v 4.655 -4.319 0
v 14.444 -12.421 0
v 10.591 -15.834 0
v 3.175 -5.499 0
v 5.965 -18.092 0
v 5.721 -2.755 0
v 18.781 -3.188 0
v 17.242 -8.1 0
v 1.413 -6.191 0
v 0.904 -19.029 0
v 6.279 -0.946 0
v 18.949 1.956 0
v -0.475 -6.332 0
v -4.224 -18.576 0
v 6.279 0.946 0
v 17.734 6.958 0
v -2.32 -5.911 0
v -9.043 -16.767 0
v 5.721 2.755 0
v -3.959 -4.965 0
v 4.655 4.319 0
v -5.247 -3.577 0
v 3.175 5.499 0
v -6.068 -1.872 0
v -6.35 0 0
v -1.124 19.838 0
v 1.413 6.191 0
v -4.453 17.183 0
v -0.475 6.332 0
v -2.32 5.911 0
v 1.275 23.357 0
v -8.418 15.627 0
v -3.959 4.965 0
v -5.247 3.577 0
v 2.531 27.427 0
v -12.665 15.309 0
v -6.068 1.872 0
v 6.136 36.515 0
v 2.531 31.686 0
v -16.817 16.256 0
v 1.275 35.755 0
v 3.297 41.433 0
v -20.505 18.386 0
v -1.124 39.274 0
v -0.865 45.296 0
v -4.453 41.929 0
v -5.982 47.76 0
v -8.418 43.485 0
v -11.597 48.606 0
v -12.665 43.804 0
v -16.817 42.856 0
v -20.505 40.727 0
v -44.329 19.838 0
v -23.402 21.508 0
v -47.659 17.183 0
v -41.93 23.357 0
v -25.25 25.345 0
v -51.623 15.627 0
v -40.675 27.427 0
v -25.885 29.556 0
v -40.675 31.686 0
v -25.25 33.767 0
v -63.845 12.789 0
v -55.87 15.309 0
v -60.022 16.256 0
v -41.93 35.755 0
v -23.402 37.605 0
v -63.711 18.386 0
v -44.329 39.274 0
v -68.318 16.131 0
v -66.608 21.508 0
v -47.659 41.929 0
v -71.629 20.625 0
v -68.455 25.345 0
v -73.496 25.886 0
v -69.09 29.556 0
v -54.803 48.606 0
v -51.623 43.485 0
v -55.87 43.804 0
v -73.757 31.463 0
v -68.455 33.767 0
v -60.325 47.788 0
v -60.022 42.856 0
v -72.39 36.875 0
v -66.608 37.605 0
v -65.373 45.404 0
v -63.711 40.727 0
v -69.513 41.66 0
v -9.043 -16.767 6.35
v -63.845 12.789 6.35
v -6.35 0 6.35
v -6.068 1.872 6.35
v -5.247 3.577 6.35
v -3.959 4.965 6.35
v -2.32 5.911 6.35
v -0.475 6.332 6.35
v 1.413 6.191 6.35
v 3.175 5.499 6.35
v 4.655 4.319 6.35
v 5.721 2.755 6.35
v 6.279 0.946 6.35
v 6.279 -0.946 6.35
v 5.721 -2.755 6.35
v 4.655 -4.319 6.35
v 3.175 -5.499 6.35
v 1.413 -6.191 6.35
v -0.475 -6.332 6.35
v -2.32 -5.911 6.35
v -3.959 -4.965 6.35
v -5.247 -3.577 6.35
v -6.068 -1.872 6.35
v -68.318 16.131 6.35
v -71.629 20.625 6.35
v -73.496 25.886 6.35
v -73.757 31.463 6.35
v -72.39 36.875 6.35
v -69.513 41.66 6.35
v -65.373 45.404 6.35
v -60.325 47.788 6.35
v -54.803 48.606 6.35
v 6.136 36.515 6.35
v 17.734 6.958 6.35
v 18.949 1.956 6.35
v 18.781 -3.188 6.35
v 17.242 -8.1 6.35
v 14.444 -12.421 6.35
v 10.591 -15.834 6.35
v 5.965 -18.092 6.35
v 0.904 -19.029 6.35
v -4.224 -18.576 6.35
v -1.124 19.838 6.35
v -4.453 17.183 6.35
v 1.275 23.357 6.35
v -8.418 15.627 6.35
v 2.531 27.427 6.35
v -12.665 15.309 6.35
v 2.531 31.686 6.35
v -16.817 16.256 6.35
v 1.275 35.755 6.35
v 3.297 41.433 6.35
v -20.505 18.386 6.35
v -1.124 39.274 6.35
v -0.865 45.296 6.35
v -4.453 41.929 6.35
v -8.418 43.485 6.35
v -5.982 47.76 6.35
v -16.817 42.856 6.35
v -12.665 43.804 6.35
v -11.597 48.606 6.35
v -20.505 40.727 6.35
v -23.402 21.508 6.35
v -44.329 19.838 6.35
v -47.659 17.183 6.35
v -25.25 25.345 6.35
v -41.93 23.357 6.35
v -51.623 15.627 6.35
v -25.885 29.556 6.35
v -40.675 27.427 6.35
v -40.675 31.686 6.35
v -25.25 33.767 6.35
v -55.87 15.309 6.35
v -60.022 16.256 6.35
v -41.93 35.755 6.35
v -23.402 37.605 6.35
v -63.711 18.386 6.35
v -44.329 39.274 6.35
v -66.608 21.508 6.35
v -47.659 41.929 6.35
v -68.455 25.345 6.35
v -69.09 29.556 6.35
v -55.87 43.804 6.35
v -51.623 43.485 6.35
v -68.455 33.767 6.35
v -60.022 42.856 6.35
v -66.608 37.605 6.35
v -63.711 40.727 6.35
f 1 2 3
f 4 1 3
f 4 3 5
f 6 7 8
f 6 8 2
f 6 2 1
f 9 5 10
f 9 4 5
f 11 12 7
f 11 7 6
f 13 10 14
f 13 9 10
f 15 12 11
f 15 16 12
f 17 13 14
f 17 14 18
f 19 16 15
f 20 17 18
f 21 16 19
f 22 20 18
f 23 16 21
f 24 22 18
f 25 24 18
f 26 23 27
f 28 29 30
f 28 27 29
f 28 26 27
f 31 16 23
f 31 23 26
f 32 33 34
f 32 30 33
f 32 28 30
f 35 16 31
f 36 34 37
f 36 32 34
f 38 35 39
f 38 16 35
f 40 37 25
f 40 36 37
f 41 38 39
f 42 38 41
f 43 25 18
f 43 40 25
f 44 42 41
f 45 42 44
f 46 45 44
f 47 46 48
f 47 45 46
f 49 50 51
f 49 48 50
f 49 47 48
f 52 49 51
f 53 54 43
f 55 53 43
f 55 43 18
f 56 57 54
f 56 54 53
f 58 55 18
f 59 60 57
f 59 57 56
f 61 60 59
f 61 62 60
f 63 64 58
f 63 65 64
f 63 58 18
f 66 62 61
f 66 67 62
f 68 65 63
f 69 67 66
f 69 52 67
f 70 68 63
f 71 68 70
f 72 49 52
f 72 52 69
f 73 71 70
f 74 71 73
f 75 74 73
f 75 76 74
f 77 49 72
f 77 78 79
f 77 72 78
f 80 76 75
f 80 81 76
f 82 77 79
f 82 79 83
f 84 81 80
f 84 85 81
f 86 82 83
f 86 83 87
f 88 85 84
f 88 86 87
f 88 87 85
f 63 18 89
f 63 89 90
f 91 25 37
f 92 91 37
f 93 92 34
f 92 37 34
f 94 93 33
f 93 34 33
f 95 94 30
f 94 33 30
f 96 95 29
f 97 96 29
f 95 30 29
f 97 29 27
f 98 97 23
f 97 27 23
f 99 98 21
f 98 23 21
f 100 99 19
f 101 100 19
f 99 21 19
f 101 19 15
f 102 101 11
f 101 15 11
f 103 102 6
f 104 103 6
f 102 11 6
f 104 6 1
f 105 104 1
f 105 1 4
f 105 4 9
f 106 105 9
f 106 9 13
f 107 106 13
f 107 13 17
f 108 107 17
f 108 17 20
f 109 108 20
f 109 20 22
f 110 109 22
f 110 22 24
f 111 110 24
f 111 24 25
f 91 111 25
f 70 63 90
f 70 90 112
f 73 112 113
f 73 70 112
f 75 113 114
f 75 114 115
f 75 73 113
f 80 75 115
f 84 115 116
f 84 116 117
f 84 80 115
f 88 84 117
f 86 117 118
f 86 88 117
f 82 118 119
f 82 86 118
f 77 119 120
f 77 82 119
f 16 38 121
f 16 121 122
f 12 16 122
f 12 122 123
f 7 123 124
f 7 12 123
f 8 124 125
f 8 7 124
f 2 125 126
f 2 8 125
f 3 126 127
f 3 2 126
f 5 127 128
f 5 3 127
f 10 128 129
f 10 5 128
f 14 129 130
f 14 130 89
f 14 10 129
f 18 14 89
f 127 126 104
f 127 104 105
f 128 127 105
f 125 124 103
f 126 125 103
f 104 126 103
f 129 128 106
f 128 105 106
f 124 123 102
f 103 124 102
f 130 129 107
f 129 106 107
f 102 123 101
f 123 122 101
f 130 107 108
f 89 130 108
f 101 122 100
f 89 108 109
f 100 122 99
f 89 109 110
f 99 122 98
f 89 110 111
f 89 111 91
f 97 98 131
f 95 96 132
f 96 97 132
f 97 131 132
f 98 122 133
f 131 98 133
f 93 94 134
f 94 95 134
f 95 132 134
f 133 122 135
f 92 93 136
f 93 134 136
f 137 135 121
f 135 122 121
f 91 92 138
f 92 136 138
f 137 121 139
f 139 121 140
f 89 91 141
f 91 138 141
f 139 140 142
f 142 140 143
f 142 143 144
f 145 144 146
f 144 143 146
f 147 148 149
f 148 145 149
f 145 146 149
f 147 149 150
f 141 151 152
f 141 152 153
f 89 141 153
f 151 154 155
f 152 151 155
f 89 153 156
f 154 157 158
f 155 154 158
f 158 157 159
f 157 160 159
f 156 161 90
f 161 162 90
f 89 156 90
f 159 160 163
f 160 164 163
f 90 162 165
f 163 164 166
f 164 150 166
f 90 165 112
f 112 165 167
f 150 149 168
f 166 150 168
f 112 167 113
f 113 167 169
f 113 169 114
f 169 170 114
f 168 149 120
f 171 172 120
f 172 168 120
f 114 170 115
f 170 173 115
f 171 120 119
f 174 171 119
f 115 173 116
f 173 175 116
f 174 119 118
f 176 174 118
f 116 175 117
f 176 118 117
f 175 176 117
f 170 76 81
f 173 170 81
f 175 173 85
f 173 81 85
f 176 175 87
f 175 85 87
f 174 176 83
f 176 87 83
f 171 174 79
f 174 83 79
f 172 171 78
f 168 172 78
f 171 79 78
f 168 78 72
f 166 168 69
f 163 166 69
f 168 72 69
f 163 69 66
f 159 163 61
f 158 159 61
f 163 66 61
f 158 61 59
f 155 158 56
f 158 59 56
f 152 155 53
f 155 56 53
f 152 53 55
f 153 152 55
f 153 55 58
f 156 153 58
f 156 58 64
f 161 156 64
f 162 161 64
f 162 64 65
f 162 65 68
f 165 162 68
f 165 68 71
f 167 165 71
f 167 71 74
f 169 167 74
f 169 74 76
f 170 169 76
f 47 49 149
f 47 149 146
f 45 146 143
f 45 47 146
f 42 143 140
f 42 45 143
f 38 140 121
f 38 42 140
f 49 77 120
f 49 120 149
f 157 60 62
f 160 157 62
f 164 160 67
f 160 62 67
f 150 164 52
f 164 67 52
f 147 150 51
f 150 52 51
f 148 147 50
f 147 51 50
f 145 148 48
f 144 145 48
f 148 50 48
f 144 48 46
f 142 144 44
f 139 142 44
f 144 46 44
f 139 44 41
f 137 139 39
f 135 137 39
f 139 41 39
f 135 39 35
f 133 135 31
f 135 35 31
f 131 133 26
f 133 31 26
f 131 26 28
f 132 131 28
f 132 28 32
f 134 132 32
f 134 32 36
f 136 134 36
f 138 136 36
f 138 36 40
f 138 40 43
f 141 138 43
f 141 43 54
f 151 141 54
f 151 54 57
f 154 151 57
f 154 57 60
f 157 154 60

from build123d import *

# Parameters (mm, degrees)
BOSS_EXTRUDE1_DEPTH            = 6.35
F_1_1_DIAMETER_HOLE1_D         = 28.575
F_1_1_DIAMETER_HOLE1_DEPTH     = 25.4
F_1_1_DIAMETER_HOLE1_TIP       = 8.584796094
F_1_2_0_5_DIAMETER_HOLE1_D     = 12.7
F_1_2_0_5_DIAMETER_HOLE1_DEPTH = 25.4
F_1_2_0_5_DIAMETER_HOLE1_TIP   = 3.815464931


with BuildPart() as part:
    # Sketch1 → Boss-Extrude1 (new body)
    with BuildSketch(Plane.XY):
        with BuildLine():
            Line((-54.802639065, 48.60615919), (-11.597239065, 48.60615919))
            ThreePointArc((-11.597239065, 48.60615919), (-0.865369296, 45.295583298), (6.136456449, 36.514502629))
            Line((6.136456449, 36.514502629), (17.733695514, 6.958343439))
            ThreePointArc((17.733695514, 6.958343439), (12.633512254, -14.258221072), (-9.042758094, -16.766962338))
            Line((-9.042758094, -16.766962338), (-63.84539716, 12.789196852))
            ThreePointArc((-63.84539716, 12.789196852), (-73.273063161, 34.219412746), (-54.802639065, 48.60615919))
        make_face()
    extrude(amount=BOSS_EXTRUDE1_DEPTH)

    # 1 (1) Diameter Hole1
    with Locations(Plane.XY.offset(6.35)):
        with Locations((-54.802639065, 29.55615919), (-11.597239065, 29.55615919)):
            Hole(F_1_1_DIAMETER_HOLE1_D / 2, depth=F_1_1_DIAMETER_HOLE1_DEPTH)
            with Locations((0, 0, -(F_1_1_DIAMETER_HOLE1_DEPTH + F_1_1_DIAMETER_HOLE1_TIP / 2))):  # 118° drill point
                Cone(0, F_1_1_DIAMETER_HOLE1_D / 2, F_1_1_DIAMETER_HOLE1_TIP, mode=Mode.SUBTRACT)

    # 1/2 (0.5) Diameter Hole1
    with Locations(Plane.XY.offset(6.35)):
        with Locations((0, 0)):
            Hole(F_1_2_0_5_DIAMETER_HOLE1_D / 2, depth=F_1_2_0_5_DIAMETER_HOLE1_DEPTH)
            with Locations((0, 0, -(F_1_2_0_5_DIAMETER_HOLE1_DEPTH + F_1_2_0_5_DIAMETER_HOLE1_TIP / 2))):  # 118° drill point
                Cone(0, F_1_2_0_5_DIAMETER_HOLE1_D / 2, F_1_2_0_5_DIAMETER_HOLE1_TIP, mode=Mode.SUBTRACT)


solid = part.part
